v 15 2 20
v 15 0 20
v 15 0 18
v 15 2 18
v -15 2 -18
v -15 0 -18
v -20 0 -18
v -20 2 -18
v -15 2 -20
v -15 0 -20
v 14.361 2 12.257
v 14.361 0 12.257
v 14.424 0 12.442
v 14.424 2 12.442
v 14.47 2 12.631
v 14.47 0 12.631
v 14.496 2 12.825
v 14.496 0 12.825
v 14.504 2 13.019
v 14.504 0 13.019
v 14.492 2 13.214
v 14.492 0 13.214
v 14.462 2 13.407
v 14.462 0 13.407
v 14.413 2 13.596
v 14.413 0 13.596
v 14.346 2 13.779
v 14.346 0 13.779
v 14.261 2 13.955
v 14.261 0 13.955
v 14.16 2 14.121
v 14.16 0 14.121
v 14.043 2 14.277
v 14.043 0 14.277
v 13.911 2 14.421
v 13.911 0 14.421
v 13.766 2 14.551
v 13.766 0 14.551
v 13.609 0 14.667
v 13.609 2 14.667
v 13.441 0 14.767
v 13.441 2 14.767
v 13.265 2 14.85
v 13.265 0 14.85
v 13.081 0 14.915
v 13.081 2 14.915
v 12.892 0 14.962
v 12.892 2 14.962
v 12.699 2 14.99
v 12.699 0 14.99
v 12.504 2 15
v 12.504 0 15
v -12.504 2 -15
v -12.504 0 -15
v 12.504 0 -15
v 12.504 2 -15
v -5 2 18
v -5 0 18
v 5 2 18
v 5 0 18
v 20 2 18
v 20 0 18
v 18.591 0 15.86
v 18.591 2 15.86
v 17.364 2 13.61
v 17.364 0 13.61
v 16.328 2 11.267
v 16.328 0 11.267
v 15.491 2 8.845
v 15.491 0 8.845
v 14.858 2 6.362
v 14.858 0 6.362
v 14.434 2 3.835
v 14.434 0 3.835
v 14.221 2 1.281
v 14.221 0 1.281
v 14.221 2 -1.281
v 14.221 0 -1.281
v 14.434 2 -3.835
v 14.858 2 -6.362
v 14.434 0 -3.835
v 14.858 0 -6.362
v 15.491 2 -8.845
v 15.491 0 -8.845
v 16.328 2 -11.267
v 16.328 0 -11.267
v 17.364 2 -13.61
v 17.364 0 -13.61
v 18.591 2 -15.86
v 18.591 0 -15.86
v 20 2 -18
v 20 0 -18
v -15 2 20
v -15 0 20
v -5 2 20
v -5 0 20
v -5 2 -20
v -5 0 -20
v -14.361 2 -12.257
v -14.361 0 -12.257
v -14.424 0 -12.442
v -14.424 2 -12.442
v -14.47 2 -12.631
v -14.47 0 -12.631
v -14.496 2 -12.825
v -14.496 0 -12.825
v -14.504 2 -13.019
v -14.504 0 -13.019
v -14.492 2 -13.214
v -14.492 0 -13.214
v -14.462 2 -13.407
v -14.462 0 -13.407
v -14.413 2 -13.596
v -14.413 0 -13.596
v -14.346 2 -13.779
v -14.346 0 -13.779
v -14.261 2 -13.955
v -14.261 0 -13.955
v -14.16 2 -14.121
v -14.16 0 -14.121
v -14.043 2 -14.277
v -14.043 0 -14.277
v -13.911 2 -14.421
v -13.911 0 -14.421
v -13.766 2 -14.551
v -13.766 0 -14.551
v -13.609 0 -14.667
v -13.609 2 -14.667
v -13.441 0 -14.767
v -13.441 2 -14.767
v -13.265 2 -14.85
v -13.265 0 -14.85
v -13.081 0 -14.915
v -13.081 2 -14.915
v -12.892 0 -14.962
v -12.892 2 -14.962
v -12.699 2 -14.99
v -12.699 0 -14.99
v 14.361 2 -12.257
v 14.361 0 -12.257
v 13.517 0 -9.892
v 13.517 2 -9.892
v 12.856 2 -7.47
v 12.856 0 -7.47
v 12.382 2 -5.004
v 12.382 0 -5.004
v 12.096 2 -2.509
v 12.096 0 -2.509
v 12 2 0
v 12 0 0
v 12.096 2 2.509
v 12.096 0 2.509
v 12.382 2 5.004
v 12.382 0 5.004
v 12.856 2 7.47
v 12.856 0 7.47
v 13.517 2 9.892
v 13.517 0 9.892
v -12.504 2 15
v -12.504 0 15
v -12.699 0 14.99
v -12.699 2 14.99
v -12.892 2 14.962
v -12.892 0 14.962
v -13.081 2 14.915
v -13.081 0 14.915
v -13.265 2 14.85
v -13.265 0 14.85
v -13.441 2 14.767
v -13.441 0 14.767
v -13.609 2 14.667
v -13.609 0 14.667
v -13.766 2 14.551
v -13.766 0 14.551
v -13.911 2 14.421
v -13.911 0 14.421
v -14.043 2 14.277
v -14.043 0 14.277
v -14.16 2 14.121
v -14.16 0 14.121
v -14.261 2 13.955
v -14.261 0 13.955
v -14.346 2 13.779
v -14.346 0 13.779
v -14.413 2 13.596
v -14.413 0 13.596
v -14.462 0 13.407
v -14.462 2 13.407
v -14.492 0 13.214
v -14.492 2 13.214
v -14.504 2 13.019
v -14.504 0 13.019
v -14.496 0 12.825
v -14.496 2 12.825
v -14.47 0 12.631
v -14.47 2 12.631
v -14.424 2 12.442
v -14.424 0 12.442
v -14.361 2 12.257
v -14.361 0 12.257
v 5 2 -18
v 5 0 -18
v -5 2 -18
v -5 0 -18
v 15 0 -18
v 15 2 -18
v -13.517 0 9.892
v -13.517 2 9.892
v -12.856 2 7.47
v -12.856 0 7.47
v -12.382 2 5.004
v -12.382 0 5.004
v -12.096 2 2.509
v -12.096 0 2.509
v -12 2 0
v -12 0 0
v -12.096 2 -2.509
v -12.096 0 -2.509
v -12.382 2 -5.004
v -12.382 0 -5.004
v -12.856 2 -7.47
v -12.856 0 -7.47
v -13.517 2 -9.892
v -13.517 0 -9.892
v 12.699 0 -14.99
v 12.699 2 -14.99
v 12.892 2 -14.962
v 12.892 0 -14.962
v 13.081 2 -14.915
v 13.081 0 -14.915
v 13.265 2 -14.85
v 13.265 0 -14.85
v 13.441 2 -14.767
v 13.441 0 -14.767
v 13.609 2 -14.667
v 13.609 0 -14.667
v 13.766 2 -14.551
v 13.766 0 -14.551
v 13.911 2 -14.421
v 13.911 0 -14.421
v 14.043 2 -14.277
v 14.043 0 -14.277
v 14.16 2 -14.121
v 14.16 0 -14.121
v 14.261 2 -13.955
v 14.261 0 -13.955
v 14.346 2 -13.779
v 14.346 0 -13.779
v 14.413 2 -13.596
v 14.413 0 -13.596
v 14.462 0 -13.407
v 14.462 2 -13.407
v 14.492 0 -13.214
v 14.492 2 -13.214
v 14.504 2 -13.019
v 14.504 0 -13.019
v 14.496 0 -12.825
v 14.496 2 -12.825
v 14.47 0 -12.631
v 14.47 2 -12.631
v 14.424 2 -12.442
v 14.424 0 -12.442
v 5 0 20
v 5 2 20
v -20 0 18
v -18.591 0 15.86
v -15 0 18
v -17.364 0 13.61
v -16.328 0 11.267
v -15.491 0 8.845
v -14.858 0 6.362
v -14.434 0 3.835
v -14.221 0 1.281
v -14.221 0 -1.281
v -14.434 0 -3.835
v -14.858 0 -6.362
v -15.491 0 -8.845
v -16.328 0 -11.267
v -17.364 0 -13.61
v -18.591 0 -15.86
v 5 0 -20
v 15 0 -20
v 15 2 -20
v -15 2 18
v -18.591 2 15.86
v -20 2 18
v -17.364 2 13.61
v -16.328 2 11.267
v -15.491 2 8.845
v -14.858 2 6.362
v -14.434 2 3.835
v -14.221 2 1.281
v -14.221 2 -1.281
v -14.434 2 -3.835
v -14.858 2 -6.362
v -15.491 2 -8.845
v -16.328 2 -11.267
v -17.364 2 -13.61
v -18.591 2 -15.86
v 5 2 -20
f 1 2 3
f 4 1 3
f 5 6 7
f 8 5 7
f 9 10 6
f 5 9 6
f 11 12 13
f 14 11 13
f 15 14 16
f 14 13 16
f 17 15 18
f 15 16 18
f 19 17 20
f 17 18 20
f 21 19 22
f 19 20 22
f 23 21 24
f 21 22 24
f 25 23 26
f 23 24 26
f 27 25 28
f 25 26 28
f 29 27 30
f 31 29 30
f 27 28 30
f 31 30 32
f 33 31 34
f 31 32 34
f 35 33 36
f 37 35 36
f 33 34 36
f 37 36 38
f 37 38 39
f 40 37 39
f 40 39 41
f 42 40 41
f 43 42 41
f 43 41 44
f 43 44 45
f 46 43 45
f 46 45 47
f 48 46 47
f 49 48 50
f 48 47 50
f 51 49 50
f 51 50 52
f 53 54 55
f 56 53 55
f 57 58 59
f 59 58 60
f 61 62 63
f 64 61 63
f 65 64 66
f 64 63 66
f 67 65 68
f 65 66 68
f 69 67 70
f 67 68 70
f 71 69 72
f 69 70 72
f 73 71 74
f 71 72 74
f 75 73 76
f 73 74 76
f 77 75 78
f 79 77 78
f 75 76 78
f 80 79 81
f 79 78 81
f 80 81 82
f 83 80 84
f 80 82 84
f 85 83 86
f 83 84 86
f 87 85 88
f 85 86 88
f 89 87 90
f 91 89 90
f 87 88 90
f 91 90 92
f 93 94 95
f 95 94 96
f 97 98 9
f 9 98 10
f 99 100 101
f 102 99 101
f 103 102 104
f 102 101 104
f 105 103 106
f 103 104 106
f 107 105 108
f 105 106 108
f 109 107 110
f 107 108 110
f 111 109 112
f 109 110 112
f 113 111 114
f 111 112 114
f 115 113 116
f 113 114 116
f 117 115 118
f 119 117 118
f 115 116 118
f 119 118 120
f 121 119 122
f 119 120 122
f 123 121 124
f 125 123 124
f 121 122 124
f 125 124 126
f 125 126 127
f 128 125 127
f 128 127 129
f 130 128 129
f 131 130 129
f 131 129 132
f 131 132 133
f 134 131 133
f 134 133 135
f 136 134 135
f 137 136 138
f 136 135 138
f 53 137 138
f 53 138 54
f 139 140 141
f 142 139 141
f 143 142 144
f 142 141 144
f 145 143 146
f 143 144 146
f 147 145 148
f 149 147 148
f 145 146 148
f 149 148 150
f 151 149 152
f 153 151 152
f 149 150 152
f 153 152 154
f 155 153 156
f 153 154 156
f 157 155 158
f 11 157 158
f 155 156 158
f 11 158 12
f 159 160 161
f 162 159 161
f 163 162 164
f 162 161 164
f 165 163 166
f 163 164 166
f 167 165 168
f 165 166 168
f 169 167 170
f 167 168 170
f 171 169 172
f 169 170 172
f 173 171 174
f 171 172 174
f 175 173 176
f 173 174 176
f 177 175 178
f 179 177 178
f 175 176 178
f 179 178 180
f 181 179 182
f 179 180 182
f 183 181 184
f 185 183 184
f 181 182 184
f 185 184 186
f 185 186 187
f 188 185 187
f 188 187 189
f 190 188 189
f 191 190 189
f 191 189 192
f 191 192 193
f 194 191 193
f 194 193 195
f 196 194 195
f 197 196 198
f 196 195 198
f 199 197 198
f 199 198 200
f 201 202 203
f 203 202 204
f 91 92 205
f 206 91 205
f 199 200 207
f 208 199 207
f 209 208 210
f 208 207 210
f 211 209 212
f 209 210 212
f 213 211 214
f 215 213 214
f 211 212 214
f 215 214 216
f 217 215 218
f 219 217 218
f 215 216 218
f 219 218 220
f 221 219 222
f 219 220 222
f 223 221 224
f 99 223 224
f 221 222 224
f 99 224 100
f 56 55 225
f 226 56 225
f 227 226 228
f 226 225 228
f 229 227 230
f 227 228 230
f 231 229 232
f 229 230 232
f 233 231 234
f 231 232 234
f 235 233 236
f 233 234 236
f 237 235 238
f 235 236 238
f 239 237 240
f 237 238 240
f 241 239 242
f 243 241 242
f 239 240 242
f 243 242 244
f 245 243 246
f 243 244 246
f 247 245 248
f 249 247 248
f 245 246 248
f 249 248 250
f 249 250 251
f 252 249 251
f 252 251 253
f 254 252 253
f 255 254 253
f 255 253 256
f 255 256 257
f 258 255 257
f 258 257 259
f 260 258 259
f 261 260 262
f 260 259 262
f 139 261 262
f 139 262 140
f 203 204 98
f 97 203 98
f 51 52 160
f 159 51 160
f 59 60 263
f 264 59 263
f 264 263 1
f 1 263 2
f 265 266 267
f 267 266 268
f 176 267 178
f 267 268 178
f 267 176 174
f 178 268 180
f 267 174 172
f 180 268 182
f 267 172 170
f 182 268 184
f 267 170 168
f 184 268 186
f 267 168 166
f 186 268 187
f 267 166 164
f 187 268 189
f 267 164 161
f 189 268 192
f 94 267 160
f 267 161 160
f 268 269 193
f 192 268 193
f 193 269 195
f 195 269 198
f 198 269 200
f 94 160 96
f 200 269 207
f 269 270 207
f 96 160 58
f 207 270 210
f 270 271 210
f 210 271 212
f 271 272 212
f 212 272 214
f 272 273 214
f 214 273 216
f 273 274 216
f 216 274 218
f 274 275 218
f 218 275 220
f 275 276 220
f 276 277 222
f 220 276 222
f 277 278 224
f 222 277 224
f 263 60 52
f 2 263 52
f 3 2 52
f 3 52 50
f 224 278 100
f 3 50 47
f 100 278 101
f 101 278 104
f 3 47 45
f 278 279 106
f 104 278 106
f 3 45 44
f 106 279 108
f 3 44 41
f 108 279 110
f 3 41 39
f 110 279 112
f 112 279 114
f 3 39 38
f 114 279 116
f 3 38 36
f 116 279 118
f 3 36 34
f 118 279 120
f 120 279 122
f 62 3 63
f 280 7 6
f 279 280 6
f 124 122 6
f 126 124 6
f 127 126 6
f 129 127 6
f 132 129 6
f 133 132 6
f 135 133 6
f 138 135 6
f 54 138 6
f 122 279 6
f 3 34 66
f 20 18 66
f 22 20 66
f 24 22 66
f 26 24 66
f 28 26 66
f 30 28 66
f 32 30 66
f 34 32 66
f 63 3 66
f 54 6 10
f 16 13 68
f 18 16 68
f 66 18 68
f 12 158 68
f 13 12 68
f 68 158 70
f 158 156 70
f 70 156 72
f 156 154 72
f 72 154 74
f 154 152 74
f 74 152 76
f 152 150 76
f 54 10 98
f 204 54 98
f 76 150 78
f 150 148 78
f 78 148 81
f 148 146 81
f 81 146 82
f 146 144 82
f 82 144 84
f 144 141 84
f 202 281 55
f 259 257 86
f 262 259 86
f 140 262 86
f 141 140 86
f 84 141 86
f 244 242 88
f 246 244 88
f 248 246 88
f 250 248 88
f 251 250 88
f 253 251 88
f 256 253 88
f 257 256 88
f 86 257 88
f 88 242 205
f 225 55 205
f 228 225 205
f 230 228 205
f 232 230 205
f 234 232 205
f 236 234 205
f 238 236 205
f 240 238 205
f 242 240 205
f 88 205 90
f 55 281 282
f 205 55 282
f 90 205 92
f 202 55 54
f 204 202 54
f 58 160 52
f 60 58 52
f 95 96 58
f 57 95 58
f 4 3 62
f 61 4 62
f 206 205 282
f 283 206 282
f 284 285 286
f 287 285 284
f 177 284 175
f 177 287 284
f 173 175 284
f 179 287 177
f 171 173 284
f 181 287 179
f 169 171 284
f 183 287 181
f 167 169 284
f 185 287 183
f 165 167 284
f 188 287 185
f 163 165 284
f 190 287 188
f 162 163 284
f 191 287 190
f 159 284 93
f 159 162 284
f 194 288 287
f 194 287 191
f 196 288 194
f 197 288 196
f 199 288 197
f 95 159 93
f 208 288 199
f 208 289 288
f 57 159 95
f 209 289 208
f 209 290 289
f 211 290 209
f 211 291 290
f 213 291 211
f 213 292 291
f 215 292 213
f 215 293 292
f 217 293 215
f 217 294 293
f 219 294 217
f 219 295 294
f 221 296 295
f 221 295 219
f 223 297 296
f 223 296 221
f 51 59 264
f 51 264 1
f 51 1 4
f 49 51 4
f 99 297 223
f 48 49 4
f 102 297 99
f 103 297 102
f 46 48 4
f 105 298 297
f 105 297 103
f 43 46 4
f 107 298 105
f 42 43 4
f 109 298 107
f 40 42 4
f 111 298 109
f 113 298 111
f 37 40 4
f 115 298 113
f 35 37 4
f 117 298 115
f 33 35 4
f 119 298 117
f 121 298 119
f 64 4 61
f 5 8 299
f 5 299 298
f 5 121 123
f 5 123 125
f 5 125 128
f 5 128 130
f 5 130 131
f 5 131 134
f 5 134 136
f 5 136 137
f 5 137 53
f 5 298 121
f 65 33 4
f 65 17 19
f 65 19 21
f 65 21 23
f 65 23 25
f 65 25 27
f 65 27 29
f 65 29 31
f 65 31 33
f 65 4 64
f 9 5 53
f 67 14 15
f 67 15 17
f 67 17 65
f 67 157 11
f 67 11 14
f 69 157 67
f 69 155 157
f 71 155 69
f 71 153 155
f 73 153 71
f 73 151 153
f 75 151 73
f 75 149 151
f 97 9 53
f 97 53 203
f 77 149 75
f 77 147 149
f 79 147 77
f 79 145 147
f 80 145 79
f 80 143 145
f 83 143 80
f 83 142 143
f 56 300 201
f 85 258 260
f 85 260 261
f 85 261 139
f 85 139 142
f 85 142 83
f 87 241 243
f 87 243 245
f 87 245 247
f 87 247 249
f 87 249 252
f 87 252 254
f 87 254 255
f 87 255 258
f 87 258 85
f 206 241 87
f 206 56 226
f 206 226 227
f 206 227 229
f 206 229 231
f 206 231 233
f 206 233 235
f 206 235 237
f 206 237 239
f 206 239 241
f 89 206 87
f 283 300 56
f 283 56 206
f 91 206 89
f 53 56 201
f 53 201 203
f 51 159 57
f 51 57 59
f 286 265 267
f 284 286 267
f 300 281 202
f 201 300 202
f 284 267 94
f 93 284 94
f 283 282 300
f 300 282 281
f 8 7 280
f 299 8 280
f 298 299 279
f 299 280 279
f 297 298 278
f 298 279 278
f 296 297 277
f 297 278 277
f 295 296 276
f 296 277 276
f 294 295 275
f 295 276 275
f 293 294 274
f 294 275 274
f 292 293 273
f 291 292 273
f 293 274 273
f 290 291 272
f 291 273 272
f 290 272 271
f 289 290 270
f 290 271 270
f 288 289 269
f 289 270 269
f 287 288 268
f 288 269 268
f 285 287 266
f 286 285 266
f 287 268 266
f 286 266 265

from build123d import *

# Parameters (mm, degrees)
BOSS_EXTRUDE1_DEPTH = 2


with BuildPart() as part:
    # Sketch1 → Boss-Extrude1 (new body)
    with BuildSketch(Plane(origin=(0, 0, 0), x_dir=(1, 0, 0), z_dir=(0, 1, 0))):
        with BuildLine():
            Line((-20, -18), (-15, -18))
            Line((-15, -18), (-15, -20))
            Line((-15, -20), (-5, -20))
            Line((-5, -20), (-5, -18))
            Line((-5, -18), (5, -18))
            Line((5, -18), (5, -20))
            Line((5, -20), (15, -20))
            Line((15, -20), (15, -18))
            Line((15, -18), (20, -18))
            ThreePointArc((20, -18), (14.194156399, 0), (20, 18))
            Line((20, 18), (15, 18))
            Line((15, 18), (15, 20))
            Line((15, 20), (5, 20))
            Line((5, 20), (5, 18))
            Line((5, 18), (-5, 18))
            Line((-5, 18), (-5, 20))
            Line((-5, 20), (-15, 20))
            Line((-15, 20), (-15, 18))
            Line((-15, 18), (-20, 18))
            ThreePointArc((-20, 18), (-14.194156399, 0), (-20, -18))
        make_face()
        with BuildLine():
            Line((-12.503846381, 15), (12.503846381, 15))
            ThreePointArc((12.503846381, 15), (14.160003724, 14.121223821), (14.360769445, 12.257142857))
            ThreePointArc((14.360769445, 12.257142857), (12, 0), (14.360769445, -12.257142857))
            ThreePointArc((14.360769445, -12.257142857), (14.160003724, -14.121223821), (12.503846381, -15))
            Line((12.503846381, -15), (-12.503846381, -15))
            ThreePointArc((-12.503846381, -15), (-14.160003724, -14.121223821), (-14.360769445, -12.257142857))
            ThreePointArc((-14.360769445, -12.257142857), (-12, 0), (-14.360769445, 12.257142857))
            ThreePointArc((-14.360769445, 12.257142857), (-14.160003724, 14.121223821), (-12.503846381, 15))
        make_face(mode=Mode.SUBTRACT)
    extrude(amount=BOSS_EXTRUDE1_DEPTH)


solid = part.part
